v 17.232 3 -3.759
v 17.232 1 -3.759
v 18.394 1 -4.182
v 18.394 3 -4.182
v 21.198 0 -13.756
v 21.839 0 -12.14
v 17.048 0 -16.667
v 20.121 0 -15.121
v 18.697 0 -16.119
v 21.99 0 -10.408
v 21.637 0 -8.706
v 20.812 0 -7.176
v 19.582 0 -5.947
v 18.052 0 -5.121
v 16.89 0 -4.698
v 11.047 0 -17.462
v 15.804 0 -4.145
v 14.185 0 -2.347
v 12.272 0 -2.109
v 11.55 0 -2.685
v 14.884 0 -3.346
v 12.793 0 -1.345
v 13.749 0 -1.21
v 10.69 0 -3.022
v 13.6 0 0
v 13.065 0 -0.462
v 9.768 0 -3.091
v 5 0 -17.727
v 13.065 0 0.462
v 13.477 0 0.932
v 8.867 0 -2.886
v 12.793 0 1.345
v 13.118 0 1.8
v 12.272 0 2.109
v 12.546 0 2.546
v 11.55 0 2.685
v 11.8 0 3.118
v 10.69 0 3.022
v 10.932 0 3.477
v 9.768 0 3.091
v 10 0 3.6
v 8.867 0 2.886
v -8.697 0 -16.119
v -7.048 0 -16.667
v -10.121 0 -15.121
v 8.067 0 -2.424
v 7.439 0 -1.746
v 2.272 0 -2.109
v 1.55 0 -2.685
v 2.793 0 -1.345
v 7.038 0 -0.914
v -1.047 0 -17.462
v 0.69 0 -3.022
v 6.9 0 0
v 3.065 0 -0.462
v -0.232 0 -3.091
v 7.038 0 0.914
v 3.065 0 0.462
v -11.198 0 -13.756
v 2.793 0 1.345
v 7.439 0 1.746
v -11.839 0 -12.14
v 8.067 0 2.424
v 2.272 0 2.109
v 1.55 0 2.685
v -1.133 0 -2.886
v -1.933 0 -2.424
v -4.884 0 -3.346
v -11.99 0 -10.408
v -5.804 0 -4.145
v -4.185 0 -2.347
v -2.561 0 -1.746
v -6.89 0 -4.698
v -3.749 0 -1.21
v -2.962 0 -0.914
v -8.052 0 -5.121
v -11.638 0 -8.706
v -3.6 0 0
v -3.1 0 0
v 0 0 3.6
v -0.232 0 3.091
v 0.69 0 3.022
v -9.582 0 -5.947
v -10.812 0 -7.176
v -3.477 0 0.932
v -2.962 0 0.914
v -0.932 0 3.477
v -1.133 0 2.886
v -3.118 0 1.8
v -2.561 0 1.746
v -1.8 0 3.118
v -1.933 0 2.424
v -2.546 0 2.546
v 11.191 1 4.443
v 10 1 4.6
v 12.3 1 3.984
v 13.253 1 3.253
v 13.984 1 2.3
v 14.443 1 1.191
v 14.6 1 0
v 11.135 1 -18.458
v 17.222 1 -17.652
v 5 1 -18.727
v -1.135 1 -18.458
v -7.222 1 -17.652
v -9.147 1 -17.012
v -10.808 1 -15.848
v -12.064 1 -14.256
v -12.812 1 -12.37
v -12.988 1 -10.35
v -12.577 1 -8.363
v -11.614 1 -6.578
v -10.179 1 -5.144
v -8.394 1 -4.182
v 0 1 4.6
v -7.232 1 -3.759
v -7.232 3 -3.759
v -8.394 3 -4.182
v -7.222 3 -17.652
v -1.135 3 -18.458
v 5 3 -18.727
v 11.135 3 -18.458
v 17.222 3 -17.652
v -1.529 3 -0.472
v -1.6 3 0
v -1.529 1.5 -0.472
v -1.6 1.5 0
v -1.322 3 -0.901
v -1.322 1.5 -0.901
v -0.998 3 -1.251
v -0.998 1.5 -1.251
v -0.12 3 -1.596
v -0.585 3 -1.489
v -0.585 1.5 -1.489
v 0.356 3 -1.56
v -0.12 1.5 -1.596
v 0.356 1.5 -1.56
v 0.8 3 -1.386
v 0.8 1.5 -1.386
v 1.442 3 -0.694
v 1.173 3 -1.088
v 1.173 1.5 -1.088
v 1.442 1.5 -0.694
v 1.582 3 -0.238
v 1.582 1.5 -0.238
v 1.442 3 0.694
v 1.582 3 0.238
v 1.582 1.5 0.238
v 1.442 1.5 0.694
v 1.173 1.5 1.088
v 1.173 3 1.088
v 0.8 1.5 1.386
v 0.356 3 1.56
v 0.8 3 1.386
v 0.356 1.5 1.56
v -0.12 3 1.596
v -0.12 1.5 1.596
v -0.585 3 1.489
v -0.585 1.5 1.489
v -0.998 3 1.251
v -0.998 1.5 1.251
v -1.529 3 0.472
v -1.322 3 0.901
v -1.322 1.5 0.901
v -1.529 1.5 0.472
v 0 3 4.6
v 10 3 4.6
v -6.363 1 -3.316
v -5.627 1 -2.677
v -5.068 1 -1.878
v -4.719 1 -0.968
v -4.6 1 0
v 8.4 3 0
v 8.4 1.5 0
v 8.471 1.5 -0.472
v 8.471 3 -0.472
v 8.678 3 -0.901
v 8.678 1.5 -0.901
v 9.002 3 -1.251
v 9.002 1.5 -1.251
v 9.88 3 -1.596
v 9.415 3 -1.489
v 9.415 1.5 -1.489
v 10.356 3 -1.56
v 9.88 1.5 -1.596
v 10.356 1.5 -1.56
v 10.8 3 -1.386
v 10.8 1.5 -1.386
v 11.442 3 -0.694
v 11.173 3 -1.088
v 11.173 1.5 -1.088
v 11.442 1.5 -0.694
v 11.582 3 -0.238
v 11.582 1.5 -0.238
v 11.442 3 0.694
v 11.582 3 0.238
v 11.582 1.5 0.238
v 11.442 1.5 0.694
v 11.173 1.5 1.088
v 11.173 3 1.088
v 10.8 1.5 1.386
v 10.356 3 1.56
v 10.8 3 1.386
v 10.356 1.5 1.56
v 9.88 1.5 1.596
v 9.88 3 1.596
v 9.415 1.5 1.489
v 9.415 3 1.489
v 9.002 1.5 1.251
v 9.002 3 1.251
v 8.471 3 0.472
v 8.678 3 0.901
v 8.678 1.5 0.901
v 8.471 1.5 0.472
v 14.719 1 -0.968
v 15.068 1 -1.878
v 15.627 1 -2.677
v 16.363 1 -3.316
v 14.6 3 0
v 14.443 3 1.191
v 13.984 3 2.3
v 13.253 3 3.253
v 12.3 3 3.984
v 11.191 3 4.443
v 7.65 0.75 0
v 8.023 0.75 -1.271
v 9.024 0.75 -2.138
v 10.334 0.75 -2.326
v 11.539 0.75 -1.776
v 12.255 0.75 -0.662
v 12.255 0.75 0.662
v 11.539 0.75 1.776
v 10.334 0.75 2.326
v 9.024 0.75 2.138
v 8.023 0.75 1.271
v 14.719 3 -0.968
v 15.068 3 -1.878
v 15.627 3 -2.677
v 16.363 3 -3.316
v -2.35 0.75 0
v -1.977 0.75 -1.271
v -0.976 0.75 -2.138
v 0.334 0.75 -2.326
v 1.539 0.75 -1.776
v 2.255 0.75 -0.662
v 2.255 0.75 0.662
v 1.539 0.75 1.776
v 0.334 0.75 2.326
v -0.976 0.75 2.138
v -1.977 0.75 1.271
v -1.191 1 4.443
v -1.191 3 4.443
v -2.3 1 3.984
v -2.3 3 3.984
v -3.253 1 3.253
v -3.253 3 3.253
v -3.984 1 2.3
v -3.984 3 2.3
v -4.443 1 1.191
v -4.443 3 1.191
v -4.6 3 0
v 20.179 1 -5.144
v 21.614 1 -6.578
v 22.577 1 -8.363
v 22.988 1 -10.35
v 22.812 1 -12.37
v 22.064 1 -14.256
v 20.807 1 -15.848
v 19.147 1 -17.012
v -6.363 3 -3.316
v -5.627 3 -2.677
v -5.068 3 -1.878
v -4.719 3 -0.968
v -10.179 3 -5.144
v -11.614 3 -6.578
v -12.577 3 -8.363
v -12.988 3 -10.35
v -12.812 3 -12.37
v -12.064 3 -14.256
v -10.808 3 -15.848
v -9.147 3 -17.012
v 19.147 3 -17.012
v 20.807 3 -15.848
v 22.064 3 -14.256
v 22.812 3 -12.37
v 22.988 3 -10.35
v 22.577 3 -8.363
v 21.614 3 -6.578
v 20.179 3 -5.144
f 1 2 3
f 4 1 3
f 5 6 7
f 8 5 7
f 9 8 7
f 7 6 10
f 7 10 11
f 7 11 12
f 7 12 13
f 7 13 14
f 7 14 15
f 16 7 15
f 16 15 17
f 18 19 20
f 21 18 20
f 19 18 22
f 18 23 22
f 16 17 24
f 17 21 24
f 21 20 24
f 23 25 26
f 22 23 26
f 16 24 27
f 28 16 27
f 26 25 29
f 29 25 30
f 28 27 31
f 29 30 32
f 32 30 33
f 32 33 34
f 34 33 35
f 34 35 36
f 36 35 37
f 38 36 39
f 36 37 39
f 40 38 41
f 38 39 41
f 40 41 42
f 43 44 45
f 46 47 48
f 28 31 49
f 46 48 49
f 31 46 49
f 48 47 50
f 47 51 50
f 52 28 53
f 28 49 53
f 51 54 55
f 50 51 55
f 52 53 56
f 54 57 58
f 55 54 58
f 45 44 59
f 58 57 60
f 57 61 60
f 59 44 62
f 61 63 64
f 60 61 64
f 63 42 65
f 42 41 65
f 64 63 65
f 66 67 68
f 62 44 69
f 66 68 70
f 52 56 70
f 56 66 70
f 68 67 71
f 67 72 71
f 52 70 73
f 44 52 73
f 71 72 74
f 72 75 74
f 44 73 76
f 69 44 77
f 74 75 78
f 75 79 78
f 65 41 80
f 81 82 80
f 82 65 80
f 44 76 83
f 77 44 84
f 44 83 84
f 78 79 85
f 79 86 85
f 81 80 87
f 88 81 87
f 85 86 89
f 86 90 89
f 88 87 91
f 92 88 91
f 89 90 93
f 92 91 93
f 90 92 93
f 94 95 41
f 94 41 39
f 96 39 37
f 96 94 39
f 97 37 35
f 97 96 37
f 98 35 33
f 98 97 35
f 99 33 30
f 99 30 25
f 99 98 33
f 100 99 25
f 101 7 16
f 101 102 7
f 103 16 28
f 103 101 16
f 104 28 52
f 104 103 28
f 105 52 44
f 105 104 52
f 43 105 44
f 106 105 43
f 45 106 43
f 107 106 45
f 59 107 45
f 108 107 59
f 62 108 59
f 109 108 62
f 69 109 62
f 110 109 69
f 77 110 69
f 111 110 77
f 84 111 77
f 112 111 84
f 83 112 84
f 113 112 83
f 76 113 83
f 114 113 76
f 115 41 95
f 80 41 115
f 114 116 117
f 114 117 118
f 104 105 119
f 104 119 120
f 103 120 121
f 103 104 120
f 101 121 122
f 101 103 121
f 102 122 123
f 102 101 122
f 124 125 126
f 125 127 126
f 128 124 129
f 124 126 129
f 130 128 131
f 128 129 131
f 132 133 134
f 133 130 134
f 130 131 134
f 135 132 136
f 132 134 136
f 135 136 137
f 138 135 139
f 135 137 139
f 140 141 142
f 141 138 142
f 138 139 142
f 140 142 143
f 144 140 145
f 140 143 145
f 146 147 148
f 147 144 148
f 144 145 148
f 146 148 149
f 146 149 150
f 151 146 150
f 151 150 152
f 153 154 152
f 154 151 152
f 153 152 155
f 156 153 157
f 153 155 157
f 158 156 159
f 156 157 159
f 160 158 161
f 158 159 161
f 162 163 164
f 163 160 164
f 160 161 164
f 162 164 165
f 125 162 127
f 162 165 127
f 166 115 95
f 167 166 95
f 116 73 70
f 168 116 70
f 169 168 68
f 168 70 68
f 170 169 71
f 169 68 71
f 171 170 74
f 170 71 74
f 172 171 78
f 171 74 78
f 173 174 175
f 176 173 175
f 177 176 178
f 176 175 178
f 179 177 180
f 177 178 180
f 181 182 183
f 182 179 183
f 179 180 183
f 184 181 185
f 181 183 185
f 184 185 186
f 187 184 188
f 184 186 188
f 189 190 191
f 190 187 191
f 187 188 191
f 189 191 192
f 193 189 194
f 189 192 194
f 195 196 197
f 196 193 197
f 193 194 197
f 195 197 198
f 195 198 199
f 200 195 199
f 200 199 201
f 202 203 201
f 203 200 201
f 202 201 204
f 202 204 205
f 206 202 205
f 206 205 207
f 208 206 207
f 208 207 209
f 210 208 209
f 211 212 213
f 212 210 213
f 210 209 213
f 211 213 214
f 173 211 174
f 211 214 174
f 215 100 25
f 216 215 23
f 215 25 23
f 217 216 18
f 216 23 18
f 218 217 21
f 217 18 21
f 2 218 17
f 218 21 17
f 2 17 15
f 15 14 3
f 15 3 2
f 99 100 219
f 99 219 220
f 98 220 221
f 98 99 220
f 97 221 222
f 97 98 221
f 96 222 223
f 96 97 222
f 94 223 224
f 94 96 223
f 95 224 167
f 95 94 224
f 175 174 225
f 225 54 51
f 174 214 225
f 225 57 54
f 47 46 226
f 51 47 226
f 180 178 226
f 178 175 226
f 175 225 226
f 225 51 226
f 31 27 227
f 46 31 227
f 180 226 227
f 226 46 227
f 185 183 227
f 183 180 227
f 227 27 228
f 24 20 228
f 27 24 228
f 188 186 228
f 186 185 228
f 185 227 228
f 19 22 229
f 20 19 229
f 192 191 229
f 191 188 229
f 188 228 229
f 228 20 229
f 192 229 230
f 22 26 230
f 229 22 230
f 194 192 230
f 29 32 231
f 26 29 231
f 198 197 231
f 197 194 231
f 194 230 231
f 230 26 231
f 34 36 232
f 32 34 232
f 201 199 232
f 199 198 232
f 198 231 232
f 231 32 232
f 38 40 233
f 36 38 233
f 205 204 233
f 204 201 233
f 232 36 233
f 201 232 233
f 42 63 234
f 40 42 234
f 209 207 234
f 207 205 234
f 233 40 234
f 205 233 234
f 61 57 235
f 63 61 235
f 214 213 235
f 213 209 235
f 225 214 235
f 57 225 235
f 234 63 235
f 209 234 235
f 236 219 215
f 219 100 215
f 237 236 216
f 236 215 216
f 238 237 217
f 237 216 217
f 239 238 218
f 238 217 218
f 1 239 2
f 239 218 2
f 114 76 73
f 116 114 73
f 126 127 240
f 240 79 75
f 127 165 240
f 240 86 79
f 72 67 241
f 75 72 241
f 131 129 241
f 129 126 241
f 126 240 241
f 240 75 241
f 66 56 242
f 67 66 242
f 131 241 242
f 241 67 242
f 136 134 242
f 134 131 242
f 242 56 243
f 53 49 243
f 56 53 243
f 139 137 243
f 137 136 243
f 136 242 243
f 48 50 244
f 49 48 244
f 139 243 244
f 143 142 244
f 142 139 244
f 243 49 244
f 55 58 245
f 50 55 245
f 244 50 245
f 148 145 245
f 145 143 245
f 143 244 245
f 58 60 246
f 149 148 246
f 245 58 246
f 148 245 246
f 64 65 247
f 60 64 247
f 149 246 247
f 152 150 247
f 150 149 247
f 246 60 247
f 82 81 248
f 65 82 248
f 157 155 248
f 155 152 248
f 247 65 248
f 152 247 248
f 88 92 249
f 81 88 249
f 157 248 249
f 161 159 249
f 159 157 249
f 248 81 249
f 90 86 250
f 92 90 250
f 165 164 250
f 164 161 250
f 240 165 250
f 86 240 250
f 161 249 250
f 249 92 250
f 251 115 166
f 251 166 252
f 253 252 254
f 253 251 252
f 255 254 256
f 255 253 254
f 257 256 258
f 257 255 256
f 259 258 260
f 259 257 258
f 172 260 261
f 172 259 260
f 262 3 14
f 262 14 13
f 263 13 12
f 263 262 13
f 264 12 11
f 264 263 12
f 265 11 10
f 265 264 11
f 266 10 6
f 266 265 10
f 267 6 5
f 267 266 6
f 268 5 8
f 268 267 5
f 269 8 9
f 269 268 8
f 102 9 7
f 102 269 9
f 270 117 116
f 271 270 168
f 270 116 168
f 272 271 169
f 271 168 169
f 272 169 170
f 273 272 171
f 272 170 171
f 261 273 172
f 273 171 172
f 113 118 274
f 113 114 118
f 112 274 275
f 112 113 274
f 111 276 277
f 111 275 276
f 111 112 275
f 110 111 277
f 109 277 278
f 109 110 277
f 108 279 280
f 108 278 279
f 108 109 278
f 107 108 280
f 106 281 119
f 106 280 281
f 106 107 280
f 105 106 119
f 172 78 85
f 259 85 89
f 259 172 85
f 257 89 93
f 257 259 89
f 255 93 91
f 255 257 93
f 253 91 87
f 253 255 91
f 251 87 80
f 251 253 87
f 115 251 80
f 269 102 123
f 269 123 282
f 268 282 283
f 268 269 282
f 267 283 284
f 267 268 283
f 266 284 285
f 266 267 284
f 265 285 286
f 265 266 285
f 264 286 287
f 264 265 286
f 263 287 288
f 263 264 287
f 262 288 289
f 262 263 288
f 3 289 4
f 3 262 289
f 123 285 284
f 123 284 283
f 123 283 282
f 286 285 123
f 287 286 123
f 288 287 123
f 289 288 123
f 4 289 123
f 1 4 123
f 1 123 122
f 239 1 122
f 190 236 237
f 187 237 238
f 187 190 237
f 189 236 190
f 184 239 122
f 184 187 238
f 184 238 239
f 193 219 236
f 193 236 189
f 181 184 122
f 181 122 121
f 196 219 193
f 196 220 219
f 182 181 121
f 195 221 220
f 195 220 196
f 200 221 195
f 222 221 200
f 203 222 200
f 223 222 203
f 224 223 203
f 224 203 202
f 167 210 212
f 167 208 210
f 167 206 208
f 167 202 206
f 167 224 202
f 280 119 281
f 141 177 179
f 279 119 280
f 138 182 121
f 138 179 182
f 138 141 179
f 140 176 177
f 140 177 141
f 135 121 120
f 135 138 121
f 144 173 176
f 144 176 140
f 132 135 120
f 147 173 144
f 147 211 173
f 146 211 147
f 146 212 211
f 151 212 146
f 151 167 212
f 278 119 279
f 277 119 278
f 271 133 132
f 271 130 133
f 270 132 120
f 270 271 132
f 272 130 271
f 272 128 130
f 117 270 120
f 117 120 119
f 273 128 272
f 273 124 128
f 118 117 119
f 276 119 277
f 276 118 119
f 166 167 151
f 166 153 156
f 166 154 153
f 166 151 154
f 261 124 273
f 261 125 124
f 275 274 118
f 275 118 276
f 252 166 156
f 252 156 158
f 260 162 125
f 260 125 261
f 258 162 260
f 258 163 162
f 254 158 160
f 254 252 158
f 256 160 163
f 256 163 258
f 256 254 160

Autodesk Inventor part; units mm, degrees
ref_plane "YZ Plane" through (0, 0, 0) normal (1, 0, 0) x (0, 1, 0)
ref_plane "XZ Plane" through (0, 0, 0) normal (0, 1, 0) x (-1, 0, 0)
ref_plane "XY Plane" through (0, 0, 0) normal (0, 0, 1) x (1, 0, 0)
sketch "Skizze1" plane through (0, 0, 0) normal (0, 1, 0) x (-1, 0, 0)
  circle A0 centre (0, 0) radius 1.6
  circle A1 centre (-10, 0) radius 1.6
  line L0 (0, 4.6) -> (-10, 4.6)
  arc A2 (-10, 4.6) -> (-14.6, 0) centre (-10, 0) ccw
  arc A3 (-17.2319, -3.7588) -> (-14.6, 0) centre (-18.6, 0) ccw
  arc A4 (4.6, 0) -> (0, 4.6) centre (0, 0) ccw
  arc A5 (4.6, 0) -> (7.2319, -3.7588) centre (8.6, 0) ccw
  line L1 (7.2319, -3.7588) -> (8.3941, -4.1818)
  arc A6 (7.2222, -17.6521) -> (8.3941, -4.1818) centre (6, -10.7596) ccw
  arc A7 (-17.2222, -17.6521) -> (7.2222, -17.6521) centre (-5, 51.2726) ccw
  line L2 (-17.2319, -3.7588) -> (-18.3941, -4.1818)
  arc A8 (-18.3941, -4.1818) -> (-17.2222, -17.6521) centre (-16, -10.7596) ccw
  dimension "d0" = 10
  dimension "d1" = 3.2
  dimension "d2" = 3
  dimension "d4" = 4
  dimension "d22" = 7
  dimension "d23" = 20
  dimension "d24" = 22
  dimension "d25" = 70
extrude "Extrusion1" add sketch "Skizze1" along normal blind 3
chamfer "Fase1" distance 1 angle 45 10 edges at (13.2527, 0, 3.2527) (15.3234, 0, -2.2943) (17.813, 0, -3.9703) (22.9737, 0, -11.3663) (5, 0, -18.7274) (-12.9737, 0, -11.3663) (-7.813, 0, -3.9703) (-5.3234, 0, -2.2943) (-3.2527, 0, 3.2527) (5, 0, 4.6)
chamfer "Fase3" distance 1.5 angle 45 2 edges at (11.6, 0, 0) (1.6, 0, 0)
properties part number "_3D-Druck"
